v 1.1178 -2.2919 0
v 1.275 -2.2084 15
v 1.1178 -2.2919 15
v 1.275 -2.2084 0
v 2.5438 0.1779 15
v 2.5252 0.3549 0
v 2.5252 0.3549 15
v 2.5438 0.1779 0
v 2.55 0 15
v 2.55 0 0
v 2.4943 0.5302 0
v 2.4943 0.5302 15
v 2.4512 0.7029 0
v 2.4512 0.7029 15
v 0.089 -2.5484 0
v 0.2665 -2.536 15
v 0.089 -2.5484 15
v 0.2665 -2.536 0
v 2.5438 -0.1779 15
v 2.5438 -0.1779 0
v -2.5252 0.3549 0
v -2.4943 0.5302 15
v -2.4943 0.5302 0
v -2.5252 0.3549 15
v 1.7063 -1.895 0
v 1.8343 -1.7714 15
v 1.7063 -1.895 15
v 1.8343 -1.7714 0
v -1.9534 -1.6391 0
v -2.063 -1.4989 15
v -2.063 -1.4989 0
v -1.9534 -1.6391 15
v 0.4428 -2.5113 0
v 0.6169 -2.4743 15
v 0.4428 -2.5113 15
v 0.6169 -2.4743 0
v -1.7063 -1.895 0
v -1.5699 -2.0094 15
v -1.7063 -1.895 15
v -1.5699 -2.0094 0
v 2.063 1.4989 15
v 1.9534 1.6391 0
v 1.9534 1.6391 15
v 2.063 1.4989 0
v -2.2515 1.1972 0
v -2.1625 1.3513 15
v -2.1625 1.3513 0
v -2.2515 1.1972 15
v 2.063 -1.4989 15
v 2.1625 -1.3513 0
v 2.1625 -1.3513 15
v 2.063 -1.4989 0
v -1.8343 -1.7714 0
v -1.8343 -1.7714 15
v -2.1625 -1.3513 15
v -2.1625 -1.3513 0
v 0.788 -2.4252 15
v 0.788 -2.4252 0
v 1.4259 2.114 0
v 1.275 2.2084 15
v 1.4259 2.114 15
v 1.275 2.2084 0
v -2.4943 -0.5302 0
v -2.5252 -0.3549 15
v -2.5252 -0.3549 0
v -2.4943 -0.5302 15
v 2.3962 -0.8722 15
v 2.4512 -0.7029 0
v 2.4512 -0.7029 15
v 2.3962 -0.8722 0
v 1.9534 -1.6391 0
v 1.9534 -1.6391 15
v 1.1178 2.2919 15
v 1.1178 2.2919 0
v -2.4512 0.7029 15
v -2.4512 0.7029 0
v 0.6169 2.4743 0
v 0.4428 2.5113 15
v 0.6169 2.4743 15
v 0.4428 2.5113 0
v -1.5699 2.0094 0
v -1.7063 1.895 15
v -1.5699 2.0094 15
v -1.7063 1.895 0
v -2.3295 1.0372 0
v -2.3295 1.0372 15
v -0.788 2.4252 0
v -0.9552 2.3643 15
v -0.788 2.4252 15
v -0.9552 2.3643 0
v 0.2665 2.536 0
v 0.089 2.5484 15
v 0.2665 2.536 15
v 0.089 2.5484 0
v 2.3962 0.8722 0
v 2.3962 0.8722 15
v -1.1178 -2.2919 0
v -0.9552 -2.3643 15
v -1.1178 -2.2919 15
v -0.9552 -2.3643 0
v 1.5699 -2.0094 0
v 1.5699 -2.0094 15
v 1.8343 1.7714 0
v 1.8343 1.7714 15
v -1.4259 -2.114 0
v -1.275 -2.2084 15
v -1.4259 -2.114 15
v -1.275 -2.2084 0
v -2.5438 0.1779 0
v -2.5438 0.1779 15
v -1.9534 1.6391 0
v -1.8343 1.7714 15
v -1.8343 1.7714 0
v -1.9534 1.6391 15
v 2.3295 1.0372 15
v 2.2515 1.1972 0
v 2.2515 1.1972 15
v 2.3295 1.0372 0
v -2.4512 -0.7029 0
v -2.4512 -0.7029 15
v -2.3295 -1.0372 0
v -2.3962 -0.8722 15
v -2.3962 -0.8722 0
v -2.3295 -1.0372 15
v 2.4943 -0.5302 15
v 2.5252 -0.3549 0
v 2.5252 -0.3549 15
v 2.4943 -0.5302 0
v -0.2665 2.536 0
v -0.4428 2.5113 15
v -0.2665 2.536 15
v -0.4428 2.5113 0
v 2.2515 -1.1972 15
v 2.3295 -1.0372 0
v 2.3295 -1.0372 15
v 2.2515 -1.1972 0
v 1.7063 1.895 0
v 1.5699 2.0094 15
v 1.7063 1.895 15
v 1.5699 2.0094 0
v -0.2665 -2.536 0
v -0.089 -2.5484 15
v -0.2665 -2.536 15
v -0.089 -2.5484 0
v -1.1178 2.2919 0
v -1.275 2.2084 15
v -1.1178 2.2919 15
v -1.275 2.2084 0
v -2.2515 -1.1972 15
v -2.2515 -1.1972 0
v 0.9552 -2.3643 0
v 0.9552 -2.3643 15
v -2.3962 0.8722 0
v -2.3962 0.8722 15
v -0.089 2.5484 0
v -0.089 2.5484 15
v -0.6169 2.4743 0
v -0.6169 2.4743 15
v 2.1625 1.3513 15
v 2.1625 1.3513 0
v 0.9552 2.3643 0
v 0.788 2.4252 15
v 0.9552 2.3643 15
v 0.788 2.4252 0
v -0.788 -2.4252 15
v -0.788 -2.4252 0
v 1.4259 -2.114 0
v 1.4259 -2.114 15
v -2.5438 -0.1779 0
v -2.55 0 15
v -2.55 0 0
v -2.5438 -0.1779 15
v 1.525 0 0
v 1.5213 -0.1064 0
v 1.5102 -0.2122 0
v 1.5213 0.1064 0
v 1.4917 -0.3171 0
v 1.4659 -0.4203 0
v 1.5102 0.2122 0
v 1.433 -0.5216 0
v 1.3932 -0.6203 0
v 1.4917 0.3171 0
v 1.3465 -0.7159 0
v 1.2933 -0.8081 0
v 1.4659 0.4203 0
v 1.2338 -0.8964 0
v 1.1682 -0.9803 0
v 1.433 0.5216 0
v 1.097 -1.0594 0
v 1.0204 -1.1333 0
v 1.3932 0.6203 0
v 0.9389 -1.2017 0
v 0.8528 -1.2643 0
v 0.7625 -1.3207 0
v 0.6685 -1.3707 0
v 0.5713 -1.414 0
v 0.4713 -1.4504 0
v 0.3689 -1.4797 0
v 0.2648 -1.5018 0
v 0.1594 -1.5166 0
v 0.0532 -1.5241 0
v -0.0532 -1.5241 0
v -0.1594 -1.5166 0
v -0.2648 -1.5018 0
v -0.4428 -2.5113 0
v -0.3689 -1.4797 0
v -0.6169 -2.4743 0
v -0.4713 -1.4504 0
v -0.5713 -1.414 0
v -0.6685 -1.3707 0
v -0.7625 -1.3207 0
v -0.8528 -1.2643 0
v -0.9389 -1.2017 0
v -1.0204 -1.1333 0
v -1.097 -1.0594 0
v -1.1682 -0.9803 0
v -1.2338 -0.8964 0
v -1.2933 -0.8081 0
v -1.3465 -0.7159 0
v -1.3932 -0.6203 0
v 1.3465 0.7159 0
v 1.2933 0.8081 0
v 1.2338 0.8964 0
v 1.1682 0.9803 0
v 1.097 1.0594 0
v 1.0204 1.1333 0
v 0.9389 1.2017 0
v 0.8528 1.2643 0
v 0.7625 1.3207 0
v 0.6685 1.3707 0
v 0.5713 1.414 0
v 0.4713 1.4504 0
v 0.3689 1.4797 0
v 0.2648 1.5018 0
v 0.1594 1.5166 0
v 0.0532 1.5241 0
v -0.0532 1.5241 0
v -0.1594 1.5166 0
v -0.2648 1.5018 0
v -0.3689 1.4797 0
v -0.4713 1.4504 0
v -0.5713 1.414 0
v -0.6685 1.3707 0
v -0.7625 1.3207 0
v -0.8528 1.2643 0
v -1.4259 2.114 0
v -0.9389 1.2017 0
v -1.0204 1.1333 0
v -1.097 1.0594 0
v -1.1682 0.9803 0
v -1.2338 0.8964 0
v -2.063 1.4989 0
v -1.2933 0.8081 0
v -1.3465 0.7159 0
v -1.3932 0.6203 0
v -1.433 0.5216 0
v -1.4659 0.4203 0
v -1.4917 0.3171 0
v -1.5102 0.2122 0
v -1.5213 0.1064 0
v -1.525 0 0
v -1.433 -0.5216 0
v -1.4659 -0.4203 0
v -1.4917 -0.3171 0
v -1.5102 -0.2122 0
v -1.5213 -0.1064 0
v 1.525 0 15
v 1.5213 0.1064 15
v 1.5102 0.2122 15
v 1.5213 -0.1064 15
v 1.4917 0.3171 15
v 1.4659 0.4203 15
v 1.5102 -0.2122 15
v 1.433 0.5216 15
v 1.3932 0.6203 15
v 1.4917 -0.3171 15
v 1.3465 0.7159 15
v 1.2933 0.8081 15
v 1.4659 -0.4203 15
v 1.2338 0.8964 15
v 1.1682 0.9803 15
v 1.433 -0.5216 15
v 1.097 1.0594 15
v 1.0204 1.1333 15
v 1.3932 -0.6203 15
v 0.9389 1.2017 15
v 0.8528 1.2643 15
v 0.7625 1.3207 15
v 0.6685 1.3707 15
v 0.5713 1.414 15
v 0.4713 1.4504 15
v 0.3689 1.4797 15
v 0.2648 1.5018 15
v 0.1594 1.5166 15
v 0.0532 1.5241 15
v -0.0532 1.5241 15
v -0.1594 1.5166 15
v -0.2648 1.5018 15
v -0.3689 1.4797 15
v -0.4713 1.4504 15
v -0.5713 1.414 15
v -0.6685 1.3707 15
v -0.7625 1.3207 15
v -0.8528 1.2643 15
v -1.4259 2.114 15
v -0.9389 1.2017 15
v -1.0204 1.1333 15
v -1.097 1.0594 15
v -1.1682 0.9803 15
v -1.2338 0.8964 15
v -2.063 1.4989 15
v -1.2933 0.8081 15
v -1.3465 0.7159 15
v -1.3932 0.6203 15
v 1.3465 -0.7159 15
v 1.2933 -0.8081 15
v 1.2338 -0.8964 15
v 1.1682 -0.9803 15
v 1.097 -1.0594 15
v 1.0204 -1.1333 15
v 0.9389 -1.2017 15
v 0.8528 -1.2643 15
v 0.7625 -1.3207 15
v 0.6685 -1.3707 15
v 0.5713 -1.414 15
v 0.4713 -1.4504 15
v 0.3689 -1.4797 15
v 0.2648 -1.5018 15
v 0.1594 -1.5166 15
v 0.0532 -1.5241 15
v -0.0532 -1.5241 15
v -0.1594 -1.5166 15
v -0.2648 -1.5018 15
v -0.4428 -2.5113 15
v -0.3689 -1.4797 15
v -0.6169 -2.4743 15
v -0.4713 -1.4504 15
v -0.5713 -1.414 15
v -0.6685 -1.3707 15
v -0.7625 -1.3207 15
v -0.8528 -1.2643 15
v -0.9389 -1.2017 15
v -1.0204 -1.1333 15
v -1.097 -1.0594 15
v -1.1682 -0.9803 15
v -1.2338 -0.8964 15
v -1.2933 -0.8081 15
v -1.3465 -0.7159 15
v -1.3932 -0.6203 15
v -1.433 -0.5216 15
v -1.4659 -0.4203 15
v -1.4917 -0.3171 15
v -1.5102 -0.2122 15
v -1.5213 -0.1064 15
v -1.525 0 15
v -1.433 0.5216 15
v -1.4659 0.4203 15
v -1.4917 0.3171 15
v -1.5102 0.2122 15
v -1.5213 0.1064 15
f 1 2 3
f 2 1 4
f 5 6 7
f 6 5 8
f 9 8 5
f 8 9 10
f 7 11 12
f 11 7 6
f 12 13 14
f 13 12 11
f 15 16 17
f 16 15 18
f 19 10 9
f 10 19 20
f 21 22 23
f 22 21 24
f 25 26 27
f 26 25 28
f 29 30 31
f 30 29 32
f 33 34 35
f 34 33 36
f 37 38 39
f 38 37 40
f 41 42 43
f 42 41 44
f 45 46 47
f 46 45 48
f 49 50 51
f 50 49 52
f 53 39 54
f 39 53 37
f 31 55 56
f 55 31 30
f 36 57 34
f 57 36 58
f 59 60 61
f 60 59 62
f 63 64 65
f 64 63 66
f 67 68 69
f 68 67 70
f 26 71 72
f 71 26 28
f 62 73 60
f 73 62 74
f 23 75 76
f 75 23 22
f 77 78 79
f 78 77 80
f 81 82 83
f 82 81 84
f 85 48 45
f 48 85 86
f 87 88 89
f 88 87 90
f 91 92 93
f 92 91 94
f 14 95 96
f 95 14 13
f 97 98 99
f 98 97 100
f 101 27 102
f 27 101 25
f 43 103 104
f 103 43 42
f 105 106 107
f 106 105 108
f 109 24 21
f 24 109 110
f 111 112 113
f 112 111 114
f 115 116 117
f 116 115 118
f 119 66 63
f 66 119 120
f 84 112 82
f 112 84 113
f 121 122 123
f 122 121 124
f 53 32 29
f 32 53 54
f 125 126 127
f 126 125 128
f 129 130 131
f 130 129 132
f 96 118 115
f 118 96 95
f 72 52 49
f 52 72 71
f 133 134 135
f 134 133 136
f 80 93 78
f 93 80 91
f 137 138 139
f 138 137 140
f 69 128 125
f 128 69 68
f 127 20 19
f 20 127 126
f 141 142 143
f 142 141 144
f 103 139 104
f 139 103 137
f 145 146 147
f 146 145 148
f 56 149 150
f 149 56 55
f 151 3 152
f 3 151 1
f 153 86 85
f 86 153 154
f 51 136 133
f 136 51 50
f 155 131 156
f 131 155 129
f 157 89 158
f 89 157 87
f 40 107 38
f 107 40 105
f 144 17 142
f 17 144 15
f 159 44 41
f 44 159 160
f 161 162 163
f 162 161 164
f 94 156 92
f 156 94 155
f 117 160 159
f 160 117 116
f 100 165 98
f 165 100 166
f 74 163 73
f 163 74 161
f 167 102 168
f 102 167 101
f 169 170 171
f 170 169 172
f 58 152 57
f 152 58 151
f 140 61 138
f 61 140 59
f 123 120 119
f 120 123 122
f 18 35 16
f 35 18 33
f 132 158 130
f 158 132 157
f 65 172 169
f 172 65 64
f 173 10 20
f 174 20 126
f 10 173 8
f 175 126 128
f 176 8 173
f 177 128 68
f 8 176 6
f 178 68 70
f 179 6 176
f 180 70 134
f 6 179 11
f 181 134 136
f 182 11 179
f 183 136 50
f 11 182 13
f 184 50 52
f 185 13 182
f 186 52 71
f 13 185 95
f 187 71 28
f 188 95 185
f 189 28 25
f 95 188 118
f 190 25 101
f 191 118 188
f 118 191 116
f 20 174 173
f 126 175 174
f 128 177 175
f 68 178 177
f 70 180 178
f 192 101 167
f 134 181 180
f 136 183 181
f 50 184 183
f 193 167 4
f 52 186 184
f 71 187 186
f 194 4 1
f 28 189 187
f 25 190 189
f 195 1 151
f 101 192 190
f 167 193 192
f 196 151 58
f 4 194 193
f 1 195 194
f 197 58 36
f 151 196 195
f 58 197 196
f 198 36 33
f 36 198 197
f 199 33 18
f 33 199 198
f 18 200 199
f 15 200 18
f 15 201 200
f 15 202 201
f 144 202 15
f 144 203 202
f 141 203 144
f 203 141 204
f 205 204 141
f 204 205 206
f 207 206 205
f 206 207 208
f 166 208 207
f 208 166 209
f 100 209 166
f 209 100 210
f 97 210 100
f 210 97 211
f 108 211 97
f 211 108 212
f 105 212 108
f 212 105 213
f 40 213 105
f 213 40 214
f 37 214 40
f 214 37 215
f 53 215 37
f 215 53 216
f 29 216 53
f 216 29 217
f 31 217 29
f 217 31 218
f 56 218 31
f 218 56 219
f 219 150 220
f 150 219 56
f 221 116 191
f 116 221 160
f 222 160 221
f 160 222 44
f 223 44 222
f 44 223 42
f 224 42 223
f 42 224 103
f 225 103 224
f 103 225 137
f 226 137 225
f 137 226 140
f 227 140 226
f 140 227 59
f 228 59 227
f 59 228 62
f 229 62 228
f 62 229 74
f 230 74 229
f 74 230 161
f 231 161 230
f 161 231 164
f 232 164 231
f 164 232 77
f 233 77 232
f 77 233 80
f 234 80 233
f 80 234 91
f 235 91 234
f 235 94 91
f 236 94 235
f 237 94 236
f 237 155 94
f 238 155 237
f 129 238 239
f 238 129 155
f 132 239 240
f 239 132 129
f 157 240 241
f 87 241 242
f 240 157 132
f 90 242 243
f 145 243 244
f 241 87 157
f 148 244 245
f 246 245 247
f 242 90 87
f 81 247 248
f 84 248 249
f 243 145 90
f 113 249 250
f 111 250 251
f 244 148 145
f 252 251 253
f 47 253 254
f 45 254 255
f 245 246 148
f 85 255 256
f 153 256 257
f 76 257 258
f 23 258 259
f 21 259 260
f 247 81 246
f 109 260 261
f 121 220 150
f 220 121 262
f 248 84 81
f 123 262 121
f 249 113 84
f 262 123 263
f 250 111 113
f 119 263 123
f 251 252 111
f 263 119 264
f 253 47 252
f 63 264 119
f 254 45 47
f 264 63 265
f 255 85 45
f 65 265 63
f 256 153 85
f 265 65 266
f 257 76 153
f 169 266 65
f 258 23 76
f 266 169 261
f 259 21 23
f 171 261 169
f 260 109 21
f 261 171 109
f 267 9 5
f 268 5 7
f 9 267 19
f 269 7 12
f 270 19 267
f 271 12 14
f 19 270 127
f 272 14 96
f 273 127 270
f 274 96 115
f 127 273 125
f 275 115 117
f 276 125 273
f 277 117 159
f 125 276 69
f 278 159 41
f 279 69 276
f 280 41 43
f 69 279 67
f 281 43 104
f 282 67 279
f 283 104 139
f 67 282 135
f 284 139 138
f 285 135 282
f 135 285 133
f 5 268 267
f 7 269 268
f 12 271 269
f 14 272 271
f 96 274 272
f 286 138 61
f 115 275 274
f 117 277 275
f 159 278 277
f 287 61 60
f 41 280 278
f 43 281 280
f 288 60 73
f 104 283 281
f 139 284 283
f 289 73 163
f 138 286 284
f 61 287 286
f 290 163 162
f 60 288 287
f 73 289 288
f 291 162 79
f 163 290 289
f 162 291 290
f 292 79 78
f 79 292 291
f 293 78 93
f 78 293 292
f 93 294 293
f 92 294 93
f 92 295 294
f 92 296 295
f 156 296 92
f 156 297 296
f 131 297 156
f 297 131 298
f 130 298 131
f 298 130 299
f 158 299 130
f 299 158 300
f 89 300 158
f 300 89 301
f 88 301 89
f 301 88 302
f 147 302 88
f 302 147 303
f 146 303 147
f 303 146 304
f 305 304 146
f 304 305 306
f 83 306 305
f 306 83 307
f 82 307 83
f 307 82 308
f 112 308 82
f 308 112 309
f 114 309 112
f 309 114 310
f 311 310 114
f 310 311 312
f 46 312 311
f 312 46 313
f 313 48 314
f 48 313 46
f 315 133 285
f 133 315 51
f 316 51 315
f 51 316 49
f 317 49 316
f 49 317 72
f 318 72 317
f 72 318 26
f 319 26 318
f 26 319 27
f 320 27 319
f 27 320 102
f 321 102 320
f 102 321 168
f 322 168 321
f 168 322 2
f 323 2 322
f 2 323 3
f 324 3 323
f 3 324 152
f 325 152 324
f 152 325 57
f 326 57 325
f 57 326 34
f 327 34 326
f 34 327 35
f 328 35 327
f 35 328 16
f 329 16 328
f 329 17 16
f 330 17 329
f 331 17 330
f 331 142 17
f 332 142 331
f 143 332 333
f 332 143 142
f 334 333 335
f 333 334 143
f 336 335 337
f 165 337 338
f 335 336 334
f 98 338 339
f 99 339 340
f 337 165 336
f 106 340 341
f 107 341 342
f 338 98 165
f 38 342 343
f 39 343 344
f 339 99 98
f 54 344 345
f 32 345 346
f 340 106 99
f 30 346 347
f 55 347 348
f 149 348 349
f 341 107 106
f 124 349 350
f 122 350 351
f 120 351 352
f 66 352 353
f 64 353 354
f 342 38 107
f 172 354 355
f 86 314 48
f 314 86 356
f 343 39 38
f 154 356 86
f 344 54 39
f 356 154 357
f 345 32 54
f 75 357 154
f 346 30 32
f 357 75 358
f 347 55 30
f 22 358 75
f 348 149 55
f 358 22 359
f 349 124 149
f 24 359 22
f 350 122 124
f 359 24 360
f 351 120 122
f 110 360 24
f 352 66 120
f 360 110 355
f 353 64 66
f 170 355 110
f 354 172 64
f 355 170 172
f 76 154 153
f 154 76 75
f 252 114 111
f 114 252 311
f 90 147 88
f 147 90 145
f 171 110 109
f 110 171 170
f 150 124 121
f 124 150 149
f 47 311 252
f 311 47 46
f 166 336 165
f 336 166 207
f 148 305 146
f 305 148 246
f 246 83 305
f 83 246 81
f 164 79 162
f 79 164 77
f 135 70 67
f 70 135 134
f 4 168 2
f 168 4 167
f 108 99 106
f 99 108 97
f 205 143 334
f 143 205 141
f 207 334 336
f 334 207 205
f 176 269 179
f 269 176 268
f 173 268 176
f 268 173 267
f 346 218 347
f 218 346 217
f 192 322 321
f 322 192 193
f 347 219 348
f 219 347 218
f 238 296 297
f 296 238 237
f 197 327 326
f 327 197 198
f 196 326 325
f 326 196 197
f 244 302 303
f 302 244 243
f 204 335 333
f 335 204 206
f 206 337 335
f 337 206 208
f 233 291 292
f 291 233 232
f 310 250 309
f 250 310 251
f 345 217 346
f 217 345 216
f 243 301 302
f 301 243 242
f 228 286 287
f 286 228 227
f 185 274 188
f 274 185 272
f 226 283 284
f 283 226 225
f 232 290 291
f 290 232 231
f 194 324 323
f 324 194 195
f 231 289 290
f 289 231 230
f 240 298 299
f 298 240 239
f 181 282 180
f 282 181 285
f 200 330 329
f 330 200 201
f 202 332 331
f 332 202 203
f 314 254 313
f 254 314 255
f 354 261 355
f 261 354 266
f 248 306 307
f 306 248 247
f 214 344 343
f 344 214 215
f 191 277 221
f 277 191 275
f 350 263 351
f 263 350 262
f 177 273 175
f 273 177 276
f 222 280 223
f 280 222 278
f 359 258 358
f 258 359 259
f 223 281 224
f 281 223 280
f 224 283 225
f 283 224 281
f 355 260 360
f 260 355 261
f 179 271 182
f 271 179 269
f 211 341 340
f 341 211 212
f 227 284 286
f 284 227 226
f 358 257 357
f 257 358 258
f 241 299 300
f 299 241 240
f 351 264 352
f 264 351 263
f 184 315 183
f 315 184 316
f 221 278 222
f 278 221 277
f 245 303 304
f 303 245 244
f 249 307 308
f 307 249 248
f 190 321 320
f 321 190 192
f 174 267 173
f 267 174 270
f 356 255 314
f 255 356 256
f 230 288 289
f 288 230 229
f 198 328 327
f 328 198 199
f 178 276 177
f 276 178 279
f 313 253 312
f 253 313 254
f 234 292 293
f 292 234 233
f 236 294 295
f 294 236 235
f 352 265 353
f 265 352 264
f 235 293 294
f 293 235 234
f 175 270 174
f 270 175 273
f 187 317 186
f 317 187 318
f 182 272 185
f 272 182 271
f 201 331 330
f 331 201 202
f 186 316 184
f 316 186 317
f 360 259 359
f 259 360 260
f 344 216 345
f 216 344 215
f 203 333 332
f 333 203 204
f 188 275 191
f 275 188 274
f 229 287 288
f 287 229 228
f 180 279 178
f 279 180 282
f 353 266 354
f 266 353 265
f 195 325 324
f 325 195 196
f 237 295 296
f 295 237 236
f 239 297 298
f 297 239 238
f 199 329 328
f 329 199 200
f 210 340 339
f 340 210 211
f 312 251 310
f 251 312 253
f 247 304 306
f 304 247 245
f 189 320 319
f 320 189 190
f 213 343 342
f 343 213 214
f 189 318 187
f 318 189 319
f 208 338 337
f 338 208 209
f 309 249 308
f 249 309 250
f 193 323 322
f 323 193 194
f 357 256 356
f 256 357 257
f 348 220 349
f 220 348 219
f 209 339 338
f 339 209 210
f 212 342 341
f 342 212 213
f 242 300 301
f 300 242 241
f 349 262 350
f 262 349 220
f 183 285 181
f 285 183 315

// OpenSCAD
printer_nozzle_od = 0.4;
height = 15;
$fn = 90;
difference() {
    cylinder(d= 5.5 - printer_nozzle_od, h = height);
    cylinder(d = 2.65 + printer_nozzle_od, h = height);
}
